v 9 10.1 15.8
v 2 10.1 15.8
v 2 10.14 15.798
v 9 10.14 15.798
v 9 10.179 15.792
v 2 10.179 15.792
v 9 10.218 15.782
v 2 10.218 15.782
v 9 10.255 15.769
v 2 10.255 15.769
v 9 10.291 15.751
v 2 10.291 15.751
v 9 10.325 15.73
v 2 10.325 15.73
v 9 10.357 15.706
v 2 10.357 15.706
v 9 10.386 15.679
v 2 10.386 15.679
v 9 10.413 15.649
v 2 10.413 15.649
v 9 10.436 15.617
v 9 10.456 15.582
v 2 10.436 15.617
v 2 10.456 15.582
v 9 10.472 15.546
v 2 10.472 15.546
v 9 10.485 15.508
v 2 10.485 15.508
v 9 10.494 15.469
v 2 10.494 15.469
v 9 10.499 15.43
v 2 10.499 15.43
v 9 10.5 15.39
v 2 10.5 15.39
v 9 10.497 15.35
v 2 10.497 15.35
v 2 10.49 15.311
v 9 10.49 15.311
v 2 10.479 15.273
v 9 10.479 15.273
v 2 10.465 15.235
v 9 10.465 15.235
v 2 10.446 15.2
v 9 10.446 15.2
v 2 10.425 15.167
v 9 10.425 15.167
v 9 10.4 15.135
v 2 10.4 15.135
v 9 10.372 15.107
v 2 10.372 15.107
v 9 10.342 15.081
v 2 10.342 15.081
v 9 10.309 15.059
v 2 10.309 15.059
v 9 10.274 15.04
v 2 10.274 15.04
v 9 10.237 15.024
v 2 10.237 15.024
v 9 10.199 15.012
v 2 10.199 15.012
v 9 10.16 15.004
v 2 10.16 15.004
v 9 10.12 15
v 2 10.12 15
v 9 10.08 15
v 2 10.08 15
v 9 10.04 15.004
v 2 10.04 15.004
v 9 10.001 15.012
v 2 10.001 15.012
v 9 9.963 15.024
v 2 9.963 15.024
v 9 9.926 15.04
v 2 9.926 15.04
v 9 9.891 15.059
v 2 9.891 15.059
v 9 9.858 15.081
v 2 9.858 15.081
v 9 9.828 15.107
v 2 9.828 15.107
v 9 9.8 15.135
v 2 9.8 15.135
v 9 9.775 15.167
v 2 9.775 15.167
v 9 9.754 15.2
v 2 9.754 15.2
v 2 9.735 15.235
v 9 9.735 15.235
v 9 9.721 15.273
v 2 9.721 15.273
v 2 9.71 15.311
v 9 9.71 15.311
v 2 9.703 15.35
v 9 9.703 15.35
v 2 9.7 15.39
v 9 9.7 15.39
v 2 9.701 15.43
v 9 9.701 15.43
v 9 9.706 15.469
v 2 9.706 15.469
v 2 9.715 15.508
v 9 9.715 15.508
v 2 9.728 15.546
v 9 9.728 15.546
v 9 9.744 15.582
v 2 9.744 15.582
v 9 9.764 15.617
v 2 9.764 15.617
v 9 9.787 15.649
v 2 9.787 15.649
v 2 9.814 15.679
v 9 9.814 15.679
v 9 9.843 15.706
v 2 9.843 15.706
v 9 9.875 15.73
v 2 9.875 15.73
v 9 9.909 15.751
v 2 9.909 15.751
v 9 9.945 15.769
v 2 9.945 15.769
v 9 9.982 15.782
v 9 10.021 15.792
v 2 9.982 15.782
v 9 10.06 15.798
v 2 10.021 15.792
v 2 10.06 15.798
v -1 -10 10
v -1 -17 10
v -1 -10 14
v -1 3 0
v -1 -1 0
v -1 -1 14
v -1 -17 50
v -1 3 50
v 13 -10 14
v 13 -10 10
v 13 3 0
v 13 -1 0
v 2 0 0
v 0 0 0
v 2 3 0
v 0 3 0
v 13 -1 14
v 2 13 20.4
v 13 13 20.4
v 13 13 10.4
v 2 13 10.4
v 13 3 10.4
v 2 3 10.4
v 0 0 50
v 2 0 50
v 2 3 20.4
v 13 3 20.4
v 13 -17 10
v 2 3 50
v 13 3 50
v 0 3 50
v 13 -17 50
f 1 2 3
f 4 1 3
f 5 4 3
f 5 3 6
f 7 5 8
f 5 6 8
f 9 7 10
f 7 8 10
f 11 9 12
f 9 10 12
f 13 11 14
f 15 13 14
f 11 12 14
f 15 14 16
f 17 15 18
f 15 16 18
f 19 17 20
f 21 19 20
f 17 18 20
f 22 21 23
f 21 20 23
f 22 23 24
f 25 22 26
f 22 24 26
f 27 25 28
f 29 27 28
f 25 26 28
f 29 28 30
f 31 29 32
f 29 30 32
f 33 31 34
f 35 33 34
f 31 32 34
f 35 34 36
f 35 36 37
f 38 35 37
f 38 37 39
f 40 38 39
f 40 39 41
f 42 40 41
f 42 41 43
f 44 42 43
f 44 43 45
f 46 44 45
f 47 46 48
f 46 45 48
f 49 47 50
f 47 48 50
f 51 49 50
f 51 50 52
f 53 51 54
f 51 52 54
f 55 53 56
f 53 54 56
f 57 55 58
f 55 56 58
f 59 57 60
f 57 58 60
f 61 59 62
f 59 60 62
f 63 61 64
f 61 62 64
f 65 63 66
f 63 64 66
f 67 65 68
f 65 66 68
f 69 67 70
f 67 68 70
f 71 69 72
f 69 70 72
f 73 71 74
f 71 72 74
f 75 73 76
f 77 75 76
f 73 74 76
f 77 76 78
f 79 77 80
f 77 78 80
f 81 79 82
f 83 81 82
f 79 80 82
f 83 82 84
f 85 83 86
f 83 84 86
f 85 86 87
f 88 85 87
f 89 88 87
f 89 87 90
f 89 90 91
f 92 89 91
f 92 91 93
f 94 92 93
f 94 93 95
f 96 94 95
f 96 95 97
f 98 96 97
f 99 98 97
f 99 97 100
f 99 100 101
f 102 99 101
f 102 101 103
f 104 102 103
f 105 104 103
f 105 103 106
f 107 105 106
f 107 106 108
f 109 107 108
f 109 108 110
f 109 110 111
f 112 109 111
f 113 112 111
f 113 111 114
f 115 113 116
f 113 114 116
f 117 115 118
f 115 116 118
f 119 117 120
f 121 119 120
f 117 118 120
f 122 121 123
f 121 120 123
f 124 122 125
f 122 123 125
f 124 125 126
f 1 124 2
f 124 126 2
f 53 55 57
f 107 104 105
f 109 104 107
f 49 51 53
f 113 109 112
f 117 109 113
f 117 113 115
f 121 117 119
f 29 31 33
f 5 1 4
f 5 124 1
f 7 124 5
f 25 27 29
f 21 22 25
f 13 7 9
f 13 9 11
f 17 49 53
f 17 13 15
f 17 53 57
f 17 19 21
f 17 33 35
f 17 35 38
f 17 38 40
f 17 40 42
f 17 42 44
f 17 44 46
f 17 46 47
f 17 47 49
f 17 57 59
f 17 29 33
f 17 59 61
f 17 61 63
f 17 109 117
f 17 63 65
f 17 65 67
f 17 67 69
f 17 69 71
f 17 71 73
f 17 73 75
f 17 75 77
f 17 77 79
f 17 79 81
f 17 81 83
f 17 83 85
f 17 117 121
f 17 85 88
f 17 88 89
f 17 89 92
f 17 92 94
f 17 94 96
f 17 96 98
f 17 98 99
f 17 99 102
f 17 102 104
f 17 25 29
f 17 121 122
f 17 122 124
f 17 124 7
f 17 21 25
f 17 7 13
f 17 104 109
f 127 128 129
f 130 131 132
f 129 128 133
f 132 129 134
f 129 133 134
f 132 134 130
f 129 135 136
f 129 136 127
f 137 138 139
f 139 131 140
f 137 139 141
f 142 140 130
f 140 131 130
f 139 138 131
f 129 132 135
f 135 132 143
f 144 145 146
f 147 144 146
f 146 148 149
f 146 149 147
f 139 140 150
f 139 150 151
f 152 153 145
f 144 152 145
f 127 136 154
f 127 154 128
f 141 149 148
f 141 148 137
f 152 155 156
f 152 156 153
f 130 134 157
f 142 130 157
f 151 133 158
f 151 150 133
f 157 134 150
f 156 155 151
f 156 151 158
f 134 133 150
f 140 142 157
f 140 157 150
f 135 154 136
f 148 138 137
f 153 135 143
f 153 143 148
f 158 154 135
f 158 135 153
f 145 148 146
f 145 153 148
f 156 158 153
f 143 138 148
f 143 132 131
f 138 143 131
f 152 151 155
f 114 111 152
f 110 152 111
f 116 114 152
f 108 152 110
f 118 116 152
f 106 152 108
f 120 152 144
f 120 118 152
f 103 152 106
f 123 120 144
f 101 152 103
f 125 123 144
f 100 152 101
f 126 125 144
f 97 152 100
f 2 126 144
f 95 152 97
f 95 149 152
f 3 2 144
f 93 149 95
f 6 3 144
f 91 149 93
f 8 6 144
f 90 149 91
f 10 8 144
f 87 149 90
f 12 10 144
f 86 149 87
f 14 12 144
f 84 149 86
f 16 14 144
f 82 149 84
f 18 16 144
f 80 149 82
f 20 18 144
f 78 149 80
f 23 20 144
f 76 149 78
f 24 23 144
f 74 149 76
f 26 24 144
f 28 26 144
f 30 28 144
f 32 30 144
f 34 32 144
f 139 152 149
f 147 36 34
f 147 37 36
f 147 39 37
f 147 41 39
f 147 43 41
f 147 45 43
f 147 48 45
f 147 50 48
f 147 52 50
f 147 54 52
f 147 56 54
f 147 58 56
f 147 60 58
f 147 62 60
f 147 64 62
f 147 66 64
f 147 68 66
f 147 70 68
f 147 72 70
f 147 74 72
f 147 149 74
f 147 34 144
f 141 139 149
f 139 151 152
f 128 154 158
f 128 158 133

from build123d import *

# Parameters (mm, degrees)
BOSS_EXTRUDE1_DEPTH = 50
SKETCH2_W           = 50
SKETCH2_H           = 4
BOSS_EXTRUDE2_DEPTH = 10
SKETCH4_W           = 14
SKETCH4_H           = 36
BOSS_EXTRUDE3_DEPTH = 16
SKETCH5_W           = 14
SKETCH5_H           = 7
BOSS_EXTRUDE4_DEPTH = 4
SKETCH7_W           = 10
SKETCH7_H           = 10
BOSS_EXTRUDE5_DEPTH = 11
SKETCH8_R           = 0.4
CUT_EXTRUDE2_DEPTH  = 7


with BuildPart() as part:
    # Sketch1 → Boss-Extrude1 (new body)
    with BuildSketch(Plane.XY):
        Polygon((0, 0), (2, 0), (2, 3), (3, 3), (3, -1), (-1, -1), (-1, 3), (0, 3), align=None)
    extrude(amount=BOSS_EXTRUDE1_DEPTH)

    # Sketch2 → Boss-Extrude2 (add)
    with BuildSketch(Plane(origin=(3, 0, 0), x_dir=(0, 0, -1), z_dir=(1, 0, 0))):
        with Locations((-25, 1)):
            Rectangle(SKETCH2_W, SKETCH2_H)
    extrude(amount=BOSS_EXTRUDE2_DEPTH)

    # Sketch4 → Boss-Extrude3 (add)
    with BuildSketch(Plane.XZ.offset(1)):
        with Locations((6, 32)):
            Rectangle(SKETCH4_W, SKETCH4_H)
    extrude(amount=BOSS_EXTRUDE3_DEPTH)

    # Sketch5 → Boss-Extrude4 (add)
    with BuildSketch(Plane(origin=(0, 0, 14), x_dir=(-1, 0, 0), z_dir=(0, 0, -1))):
        with Locations((-6, -13.5)):
            Rectangle(SKETCH5_W, SKETCH5_H)
    extrude(amount=BOSS_EXTRUDE4_DEPTH)

    # Sketch7 → Boss-Extrude5 (add)
    with BuildSketch(Plane(origin=(13, 0, 0), x_dir=(0, 0, -1), z_dir=(1, 0, 0))):
        with Locations((-15.4, 8)):
            Rectangle(SKETCH7_W, SKETCH7_H)
    extrude(amount=-BOSS_EXTRUDE5_DEPTH)

    # Sketch8 → Cut-Extrude2 (cut)
    with BuildSketch(Plane.ZY.offset(-2)):
        with Locations((15.4, 10.1)):
            Circle(SKETCH8_R)
    extrude(amount=-CUT_EXTRUDE2_DEPTH, mode=Mode.SUBTRACT)


solid = part.part
